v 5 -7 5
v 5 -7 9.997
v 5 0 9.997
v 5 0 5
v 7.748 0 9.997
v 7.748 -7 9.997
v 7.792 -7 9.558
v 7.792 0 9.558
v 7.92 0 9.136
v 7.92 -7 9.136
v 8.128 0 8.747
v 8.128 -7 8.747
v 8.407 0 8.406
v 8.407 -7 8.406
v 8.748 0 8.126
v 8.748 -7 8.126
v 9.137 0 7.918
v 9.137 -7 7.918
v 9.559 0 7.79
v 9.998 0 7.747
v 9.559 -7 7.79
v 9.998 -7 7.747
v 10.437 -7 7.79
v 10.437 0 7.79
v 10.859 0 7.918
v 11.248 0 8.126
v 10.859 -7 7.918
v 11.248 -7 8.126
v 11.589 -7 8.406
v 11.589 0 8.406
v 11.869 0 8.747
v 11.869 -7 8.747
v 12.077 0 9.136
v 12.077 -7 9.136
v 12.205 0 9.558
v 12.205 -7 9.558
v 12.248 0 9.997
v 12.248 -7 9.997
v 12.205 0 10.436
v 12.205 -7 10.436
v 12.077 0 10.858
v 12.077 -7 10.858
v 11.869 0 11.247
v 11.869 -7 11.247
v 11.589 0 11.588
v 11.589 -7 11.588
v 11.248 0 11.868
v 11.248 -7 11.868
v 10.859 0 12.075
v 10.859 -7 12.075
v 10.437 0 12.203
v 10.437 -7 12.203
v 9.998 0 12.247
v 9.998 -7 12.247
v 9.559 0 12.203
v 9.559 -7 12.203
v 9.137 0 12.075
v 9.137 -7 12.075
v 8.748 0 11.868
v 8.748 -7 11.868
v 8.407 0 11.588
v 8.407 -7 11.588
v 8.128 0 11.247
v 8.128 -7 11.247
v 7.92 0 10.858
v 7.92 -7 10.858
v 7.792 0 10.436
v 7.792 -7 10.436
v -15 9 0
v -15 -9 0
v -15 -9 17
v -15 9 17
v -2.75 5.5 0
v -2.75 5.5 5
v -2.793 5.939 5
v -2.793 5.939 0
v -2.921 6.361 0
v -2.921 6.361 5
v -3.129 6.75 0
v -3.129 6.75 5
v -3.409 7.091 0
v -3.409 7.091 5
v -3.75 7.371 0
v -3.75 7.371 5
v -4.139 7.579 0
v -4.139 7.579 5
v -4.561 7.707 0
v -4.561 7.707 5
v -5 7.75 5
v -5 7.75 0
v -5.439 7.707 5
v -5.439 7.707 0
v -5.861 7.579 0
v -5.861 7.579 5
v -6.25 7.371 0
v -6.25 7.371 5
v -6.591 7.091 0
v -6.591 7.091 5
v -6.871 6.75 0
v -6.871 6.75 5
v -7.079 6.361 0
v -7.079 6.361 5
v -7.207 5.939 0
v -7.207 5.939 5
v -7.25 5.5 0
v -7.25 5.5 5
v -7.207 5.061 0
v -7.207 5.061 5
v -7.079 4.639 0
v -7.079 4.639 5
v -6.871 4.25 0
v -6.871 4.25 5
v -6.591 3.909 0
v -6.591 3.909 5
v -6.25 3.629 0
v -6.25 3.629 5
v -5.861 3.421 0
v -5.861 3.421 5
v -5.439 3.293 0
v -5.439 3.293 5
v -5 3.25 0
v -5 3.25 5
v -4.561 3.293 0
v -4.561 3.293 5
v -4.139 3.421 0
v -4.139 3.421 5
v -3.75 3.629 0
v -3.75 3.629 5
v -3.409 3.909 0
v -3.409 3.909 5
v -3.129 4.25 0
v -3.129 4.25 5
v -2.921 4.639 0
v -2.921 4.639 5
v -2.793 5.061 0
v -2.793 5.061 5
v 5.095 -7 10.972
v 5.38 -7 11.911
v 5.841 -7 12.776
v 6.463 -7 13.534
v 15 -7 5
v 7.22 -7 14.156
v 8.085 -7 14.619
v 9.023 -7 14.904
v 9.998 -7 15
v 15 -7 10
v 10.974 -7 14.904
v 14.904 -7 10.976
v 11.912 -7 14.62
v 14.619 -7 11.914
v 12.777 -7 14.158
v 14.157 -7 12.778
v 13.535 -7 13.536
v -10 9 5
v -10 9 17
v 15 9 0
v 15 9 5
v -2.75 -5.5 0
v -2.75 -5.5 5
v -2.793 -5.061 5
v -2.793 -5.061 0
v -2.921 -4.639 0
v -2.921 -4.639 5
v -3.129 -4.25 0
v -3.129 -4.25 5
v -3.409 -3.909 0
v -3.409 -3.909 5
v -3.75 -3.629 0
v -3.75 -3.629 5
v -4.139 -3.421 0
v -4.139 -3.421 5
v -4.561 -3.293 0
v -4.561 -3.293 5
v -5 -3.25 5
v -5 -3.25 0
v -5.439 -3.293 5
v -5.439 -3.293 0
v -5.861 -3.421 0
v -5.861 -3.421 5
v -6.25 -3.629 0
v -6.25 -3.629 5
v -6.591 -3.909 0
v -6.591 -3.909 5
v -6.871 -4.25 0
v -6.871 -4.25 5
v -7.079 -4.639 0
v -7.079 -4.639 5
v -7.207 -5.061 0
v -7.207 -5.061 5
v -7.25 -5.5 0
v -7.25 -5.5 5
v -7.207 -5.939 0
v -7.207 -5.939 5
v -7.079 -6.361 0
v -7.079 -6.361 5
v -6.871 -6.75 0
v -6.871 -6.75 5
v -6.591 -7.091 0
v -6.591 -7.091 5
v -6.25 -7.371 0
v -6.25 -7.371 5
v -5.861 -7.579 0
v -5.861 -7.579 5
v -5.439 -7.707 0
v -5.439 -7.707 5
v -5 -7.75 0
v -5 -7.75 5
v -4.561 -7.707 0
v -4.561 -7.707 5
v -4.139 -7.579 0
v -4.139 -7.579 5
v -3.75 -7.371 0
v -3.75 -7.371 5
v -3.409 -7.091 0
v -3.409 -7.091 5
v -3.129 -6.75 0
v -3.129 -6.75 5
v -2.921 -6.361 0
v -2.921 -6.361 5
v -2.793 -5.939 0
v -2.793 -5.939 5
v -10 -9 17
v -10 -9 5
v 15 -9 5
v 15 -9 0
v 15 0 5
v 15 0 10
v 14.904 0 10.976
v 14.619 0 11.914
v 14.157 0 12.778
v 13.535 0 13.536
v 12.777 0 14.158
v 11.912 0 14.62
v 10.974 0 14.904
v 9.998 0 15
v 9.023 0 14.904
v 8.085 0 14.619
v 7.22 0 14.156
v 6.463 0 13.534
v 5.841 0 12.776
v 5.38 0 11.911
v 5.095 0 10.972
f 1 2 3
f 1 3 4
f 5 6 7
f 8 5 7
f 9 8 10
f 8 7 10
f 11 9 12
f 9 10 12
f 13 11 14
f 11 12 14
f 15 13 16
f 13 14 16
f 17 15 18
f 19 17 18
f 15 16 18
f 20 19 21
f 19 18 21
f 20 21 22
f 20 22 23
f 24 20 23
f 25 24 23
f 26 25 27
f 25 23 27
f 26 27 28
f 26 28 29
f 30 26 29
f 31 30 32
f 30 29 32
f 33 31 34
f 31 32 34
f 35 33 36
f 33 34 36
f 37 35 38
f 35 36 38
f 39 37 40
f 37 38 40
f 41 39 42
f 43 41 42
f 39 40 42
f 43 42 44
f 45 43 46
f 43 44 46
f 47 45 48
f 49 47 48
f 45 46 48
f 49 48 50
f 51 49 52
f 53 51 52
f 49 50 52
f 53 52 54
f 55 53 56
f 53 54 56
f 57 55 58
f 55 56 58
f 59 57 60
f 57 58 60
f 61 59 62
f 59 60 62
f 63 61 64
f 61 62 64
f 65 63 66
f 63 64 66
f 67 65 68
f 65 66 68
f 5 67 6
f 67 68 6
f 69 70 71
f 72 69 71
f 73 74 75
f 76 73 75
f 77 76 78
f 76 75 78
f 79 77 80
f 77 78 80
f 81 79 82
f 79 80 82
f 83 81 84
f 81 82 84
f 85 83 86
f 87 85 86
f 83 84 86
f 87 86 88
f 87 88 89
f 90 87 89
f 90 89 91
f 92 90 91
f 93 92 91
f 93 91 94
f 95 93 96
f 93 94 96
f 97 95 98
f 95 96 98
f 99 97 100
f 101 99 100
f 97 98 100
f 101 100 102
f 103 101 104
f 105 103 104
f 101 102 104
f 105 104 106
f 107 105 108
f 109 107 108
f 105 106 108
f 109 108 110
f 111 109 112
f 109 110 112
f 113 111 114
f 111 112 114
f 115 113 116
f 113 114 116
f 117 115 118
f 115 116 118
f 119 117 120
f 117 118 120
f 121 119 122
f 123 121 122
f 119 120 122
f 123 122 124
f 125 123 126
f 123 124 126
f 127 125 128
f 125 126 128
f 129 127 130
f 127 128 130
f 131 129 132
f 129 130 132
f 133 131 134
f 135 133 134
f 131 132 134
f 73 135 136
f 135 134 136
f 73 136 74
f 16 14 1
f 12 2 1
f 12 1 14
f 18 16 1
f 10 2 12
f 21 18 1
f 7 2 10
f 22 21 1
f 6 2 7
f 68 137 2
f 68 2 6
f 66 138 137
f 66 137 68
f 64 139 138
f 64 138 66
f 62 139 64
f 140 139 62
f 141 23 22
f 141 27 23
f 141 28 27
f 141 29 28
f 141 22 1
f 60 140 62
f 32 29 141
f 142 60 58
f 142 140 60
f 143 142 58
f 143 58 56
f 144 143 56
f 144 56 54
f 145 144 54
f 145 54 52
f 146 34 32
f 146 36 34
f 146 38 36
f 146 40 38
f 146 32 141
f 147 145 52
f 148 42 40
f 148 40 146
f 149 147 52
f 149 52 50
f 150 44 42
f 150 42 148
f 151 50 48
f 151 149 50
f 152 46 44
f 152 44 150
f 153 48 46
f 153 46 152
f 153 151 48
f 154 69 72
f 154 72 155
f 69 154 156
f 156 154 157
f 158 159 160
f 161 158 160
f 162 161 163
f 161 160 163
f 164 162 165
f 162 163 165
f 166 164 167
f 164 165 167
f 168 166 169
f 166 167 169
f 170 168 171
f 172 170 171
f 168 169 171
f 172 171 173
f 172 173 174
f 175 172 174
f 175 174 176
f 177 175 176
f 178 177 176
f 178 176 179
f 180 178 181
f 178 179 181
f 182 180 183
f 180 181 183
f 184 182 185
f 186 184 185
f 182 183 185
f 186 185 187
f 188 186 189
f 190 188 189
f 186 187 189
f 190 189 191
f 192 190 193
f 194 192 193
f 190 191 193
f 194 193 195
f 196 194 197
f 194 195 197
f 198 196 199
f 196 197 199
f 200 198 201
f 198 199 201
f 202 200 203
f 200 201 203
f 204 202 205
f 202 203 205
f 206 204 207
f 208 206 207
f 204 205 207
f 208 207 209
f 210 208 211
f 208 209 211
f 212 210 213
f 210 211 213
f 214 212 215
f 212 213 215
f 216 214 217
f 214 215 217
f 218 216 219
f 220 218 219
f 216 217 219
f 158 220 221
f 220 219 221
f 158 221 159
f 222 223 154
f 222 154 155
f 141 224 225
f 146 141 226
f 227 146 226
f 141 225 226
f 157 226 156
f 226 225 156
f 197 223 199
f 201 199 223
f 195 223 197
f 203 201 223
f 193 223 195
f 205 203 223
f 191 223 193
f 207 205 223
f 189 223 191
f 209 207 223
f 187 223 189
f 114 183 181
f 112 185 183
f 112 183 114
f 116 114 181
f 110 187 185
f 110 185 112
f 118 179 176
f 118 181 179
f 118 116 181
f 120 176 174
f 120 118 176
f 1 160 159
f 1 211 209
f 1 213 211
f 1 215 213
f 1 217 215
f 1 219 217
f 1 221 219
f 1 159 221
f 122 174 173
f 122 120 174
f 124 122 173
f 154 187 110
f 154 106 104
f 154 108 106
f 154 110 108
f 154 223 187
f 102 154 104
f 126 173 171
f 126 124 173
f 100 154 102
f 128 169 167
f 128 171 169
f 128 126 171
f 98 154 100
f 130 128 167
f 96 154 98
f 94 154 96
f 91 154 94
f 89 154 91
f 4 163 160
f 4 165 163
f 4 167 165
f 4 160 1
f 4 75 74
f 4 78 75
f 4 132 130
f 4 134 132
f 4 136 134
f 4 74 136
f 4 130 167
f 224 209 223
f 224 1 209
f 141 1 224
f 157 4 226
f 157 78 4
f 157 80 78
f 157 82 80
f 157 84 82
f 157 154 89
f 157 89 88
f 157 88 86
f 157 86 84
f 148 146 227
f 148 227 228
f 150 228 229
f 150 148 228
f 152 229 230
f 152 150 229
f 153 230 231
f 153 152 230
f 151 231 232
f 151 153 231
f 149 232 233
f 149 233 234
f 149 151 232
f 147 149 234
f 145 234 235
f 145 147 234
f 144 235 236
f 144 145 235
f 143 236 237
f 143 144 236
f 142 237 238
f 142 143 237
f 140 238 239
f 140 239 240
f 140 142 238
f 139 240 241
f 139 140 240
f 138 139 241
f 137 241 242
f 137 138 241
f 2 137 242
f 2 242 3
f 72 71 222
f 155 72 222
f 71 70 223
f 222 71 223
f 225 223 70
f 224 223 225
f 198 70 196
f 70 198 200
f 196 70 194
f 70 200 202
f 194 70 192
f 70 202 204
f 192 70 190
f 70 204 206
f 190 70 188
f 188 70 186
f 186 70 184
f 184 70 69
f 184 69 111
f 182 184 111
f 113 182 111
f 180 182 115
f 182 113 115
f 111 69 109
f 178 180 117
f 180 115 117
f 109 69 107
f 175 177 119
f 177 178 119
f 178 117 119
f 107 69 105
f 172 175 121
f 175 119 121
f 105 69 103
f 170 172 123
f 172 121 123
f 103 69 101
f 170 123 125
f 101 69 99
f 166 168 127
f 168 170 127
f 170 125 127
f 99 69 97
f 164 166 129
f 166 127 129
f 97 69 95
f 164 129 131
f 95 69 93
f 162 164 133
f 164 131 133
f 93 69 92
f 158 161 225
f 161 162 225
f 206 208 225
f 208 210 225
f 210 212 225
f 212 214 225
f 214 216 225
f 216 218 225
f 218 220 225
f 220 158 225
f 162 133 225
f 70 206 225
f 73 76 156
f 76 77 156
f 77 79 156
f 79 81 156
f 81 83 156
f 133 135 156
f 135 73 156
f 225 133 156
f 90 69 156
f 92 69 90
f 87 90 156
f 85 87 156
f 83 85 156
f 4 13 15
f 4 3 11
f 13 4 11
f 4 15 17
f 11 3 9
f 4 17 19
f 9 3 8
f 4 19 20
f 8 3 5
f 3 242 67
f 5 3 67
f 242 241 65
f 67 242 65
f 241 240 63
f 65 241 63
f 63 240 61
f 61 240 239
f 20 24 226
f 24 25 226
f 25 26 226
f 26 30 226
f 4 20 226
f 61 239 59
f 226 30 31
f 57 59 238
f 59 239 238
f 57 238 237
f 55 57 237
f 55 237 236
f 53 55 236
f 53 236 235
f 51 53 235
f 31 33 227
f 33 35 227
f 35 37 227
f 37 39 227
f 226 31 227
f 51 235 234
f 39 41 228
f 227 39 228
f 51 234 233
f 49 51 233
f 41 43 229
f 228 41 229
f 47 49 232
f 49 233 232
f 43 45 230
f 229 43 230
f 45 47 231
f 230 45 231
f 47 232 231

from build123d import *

# Parameters (mm, degrees)
F0_W     = 30
F0_H     = 18
F1_DEPTH = 5
F2_R     = 2.25
F3_DEPTH = 5
F5_START = -2
F5_DEPTH = 7
F7_DEPTH = 7
F8_W     = 5
F8_H     = 12
F9_DEPTH = 18


with BuildPart() as f1:
    # F0 (on Top) → F1 (new body)
    with BuildSketch(Plane.XY):
        Rectangle(F0_W, F0_H)
    extrude(amount=F1_DEPTH)

    # F2 (on face) → F3 (cut, through all)
    with BuildSketch(Plane.XY.offset(5)):
        with Locations((-5, 5.5)):
            Circle(F2_R)
        with Locations((-5, -5.5)):
            Circle(F2_R)
    extrude(amount=-F3_DEPTH, mode=Mode.SUBTRACT)

    # F4 (on face) → F5 (join)
    with BuildSketch(Plane.XZ.offset(9).offset(F5_START)):
        with BuildLine():
            Line((15, 5), (15, 10))
            ThreePointArc((15, 10), (9.9983587547, 14.9999997306), (5.0000010775, 9.9967175095))
            Line((5.0000010775, 9.9967175095), (5.0000010775, 5))
            Line((5.0000010775, 5), (15, 5))
        make_face()
    extrude(amount=-F5_DEPTH)

    # F6 (on face) → F7 (cut, through all)
    with BuildSketch(Plane.XZ.offset(7)):
        with BuildLine():
            Line((7.7483587547, 9.9967175095), (12.2483587547, 9.9967175095))
            ThreePointArc((12.2483587547, 9.9967175095), (9.9983587547, 12.2467175095), (7.7483587547, 9.9967175095))
        make_face()
        with BuildLine():
            ThreePointArc((7.7483587547, 9.9967175095), (9.9983587547, 7.7467175095), (12.2483587547, 9.9967175095))
            Line((12.2483587547, 9.9967175095), (7.7483587547, 9.9967175095))
        make_face()
    extrude(amount=-F7_DEPTH, mode=Mode.SUBTRACT)

    # F8 (on face) → F9 (join)
    with BuildSketch(Plane.XZ.offset(9)):
        with Locations((-12.5, 11)):
            Rectangle(F8_W, F8_H)
    extrude(amount=-F9_DEPTH)


solid = f1.part
